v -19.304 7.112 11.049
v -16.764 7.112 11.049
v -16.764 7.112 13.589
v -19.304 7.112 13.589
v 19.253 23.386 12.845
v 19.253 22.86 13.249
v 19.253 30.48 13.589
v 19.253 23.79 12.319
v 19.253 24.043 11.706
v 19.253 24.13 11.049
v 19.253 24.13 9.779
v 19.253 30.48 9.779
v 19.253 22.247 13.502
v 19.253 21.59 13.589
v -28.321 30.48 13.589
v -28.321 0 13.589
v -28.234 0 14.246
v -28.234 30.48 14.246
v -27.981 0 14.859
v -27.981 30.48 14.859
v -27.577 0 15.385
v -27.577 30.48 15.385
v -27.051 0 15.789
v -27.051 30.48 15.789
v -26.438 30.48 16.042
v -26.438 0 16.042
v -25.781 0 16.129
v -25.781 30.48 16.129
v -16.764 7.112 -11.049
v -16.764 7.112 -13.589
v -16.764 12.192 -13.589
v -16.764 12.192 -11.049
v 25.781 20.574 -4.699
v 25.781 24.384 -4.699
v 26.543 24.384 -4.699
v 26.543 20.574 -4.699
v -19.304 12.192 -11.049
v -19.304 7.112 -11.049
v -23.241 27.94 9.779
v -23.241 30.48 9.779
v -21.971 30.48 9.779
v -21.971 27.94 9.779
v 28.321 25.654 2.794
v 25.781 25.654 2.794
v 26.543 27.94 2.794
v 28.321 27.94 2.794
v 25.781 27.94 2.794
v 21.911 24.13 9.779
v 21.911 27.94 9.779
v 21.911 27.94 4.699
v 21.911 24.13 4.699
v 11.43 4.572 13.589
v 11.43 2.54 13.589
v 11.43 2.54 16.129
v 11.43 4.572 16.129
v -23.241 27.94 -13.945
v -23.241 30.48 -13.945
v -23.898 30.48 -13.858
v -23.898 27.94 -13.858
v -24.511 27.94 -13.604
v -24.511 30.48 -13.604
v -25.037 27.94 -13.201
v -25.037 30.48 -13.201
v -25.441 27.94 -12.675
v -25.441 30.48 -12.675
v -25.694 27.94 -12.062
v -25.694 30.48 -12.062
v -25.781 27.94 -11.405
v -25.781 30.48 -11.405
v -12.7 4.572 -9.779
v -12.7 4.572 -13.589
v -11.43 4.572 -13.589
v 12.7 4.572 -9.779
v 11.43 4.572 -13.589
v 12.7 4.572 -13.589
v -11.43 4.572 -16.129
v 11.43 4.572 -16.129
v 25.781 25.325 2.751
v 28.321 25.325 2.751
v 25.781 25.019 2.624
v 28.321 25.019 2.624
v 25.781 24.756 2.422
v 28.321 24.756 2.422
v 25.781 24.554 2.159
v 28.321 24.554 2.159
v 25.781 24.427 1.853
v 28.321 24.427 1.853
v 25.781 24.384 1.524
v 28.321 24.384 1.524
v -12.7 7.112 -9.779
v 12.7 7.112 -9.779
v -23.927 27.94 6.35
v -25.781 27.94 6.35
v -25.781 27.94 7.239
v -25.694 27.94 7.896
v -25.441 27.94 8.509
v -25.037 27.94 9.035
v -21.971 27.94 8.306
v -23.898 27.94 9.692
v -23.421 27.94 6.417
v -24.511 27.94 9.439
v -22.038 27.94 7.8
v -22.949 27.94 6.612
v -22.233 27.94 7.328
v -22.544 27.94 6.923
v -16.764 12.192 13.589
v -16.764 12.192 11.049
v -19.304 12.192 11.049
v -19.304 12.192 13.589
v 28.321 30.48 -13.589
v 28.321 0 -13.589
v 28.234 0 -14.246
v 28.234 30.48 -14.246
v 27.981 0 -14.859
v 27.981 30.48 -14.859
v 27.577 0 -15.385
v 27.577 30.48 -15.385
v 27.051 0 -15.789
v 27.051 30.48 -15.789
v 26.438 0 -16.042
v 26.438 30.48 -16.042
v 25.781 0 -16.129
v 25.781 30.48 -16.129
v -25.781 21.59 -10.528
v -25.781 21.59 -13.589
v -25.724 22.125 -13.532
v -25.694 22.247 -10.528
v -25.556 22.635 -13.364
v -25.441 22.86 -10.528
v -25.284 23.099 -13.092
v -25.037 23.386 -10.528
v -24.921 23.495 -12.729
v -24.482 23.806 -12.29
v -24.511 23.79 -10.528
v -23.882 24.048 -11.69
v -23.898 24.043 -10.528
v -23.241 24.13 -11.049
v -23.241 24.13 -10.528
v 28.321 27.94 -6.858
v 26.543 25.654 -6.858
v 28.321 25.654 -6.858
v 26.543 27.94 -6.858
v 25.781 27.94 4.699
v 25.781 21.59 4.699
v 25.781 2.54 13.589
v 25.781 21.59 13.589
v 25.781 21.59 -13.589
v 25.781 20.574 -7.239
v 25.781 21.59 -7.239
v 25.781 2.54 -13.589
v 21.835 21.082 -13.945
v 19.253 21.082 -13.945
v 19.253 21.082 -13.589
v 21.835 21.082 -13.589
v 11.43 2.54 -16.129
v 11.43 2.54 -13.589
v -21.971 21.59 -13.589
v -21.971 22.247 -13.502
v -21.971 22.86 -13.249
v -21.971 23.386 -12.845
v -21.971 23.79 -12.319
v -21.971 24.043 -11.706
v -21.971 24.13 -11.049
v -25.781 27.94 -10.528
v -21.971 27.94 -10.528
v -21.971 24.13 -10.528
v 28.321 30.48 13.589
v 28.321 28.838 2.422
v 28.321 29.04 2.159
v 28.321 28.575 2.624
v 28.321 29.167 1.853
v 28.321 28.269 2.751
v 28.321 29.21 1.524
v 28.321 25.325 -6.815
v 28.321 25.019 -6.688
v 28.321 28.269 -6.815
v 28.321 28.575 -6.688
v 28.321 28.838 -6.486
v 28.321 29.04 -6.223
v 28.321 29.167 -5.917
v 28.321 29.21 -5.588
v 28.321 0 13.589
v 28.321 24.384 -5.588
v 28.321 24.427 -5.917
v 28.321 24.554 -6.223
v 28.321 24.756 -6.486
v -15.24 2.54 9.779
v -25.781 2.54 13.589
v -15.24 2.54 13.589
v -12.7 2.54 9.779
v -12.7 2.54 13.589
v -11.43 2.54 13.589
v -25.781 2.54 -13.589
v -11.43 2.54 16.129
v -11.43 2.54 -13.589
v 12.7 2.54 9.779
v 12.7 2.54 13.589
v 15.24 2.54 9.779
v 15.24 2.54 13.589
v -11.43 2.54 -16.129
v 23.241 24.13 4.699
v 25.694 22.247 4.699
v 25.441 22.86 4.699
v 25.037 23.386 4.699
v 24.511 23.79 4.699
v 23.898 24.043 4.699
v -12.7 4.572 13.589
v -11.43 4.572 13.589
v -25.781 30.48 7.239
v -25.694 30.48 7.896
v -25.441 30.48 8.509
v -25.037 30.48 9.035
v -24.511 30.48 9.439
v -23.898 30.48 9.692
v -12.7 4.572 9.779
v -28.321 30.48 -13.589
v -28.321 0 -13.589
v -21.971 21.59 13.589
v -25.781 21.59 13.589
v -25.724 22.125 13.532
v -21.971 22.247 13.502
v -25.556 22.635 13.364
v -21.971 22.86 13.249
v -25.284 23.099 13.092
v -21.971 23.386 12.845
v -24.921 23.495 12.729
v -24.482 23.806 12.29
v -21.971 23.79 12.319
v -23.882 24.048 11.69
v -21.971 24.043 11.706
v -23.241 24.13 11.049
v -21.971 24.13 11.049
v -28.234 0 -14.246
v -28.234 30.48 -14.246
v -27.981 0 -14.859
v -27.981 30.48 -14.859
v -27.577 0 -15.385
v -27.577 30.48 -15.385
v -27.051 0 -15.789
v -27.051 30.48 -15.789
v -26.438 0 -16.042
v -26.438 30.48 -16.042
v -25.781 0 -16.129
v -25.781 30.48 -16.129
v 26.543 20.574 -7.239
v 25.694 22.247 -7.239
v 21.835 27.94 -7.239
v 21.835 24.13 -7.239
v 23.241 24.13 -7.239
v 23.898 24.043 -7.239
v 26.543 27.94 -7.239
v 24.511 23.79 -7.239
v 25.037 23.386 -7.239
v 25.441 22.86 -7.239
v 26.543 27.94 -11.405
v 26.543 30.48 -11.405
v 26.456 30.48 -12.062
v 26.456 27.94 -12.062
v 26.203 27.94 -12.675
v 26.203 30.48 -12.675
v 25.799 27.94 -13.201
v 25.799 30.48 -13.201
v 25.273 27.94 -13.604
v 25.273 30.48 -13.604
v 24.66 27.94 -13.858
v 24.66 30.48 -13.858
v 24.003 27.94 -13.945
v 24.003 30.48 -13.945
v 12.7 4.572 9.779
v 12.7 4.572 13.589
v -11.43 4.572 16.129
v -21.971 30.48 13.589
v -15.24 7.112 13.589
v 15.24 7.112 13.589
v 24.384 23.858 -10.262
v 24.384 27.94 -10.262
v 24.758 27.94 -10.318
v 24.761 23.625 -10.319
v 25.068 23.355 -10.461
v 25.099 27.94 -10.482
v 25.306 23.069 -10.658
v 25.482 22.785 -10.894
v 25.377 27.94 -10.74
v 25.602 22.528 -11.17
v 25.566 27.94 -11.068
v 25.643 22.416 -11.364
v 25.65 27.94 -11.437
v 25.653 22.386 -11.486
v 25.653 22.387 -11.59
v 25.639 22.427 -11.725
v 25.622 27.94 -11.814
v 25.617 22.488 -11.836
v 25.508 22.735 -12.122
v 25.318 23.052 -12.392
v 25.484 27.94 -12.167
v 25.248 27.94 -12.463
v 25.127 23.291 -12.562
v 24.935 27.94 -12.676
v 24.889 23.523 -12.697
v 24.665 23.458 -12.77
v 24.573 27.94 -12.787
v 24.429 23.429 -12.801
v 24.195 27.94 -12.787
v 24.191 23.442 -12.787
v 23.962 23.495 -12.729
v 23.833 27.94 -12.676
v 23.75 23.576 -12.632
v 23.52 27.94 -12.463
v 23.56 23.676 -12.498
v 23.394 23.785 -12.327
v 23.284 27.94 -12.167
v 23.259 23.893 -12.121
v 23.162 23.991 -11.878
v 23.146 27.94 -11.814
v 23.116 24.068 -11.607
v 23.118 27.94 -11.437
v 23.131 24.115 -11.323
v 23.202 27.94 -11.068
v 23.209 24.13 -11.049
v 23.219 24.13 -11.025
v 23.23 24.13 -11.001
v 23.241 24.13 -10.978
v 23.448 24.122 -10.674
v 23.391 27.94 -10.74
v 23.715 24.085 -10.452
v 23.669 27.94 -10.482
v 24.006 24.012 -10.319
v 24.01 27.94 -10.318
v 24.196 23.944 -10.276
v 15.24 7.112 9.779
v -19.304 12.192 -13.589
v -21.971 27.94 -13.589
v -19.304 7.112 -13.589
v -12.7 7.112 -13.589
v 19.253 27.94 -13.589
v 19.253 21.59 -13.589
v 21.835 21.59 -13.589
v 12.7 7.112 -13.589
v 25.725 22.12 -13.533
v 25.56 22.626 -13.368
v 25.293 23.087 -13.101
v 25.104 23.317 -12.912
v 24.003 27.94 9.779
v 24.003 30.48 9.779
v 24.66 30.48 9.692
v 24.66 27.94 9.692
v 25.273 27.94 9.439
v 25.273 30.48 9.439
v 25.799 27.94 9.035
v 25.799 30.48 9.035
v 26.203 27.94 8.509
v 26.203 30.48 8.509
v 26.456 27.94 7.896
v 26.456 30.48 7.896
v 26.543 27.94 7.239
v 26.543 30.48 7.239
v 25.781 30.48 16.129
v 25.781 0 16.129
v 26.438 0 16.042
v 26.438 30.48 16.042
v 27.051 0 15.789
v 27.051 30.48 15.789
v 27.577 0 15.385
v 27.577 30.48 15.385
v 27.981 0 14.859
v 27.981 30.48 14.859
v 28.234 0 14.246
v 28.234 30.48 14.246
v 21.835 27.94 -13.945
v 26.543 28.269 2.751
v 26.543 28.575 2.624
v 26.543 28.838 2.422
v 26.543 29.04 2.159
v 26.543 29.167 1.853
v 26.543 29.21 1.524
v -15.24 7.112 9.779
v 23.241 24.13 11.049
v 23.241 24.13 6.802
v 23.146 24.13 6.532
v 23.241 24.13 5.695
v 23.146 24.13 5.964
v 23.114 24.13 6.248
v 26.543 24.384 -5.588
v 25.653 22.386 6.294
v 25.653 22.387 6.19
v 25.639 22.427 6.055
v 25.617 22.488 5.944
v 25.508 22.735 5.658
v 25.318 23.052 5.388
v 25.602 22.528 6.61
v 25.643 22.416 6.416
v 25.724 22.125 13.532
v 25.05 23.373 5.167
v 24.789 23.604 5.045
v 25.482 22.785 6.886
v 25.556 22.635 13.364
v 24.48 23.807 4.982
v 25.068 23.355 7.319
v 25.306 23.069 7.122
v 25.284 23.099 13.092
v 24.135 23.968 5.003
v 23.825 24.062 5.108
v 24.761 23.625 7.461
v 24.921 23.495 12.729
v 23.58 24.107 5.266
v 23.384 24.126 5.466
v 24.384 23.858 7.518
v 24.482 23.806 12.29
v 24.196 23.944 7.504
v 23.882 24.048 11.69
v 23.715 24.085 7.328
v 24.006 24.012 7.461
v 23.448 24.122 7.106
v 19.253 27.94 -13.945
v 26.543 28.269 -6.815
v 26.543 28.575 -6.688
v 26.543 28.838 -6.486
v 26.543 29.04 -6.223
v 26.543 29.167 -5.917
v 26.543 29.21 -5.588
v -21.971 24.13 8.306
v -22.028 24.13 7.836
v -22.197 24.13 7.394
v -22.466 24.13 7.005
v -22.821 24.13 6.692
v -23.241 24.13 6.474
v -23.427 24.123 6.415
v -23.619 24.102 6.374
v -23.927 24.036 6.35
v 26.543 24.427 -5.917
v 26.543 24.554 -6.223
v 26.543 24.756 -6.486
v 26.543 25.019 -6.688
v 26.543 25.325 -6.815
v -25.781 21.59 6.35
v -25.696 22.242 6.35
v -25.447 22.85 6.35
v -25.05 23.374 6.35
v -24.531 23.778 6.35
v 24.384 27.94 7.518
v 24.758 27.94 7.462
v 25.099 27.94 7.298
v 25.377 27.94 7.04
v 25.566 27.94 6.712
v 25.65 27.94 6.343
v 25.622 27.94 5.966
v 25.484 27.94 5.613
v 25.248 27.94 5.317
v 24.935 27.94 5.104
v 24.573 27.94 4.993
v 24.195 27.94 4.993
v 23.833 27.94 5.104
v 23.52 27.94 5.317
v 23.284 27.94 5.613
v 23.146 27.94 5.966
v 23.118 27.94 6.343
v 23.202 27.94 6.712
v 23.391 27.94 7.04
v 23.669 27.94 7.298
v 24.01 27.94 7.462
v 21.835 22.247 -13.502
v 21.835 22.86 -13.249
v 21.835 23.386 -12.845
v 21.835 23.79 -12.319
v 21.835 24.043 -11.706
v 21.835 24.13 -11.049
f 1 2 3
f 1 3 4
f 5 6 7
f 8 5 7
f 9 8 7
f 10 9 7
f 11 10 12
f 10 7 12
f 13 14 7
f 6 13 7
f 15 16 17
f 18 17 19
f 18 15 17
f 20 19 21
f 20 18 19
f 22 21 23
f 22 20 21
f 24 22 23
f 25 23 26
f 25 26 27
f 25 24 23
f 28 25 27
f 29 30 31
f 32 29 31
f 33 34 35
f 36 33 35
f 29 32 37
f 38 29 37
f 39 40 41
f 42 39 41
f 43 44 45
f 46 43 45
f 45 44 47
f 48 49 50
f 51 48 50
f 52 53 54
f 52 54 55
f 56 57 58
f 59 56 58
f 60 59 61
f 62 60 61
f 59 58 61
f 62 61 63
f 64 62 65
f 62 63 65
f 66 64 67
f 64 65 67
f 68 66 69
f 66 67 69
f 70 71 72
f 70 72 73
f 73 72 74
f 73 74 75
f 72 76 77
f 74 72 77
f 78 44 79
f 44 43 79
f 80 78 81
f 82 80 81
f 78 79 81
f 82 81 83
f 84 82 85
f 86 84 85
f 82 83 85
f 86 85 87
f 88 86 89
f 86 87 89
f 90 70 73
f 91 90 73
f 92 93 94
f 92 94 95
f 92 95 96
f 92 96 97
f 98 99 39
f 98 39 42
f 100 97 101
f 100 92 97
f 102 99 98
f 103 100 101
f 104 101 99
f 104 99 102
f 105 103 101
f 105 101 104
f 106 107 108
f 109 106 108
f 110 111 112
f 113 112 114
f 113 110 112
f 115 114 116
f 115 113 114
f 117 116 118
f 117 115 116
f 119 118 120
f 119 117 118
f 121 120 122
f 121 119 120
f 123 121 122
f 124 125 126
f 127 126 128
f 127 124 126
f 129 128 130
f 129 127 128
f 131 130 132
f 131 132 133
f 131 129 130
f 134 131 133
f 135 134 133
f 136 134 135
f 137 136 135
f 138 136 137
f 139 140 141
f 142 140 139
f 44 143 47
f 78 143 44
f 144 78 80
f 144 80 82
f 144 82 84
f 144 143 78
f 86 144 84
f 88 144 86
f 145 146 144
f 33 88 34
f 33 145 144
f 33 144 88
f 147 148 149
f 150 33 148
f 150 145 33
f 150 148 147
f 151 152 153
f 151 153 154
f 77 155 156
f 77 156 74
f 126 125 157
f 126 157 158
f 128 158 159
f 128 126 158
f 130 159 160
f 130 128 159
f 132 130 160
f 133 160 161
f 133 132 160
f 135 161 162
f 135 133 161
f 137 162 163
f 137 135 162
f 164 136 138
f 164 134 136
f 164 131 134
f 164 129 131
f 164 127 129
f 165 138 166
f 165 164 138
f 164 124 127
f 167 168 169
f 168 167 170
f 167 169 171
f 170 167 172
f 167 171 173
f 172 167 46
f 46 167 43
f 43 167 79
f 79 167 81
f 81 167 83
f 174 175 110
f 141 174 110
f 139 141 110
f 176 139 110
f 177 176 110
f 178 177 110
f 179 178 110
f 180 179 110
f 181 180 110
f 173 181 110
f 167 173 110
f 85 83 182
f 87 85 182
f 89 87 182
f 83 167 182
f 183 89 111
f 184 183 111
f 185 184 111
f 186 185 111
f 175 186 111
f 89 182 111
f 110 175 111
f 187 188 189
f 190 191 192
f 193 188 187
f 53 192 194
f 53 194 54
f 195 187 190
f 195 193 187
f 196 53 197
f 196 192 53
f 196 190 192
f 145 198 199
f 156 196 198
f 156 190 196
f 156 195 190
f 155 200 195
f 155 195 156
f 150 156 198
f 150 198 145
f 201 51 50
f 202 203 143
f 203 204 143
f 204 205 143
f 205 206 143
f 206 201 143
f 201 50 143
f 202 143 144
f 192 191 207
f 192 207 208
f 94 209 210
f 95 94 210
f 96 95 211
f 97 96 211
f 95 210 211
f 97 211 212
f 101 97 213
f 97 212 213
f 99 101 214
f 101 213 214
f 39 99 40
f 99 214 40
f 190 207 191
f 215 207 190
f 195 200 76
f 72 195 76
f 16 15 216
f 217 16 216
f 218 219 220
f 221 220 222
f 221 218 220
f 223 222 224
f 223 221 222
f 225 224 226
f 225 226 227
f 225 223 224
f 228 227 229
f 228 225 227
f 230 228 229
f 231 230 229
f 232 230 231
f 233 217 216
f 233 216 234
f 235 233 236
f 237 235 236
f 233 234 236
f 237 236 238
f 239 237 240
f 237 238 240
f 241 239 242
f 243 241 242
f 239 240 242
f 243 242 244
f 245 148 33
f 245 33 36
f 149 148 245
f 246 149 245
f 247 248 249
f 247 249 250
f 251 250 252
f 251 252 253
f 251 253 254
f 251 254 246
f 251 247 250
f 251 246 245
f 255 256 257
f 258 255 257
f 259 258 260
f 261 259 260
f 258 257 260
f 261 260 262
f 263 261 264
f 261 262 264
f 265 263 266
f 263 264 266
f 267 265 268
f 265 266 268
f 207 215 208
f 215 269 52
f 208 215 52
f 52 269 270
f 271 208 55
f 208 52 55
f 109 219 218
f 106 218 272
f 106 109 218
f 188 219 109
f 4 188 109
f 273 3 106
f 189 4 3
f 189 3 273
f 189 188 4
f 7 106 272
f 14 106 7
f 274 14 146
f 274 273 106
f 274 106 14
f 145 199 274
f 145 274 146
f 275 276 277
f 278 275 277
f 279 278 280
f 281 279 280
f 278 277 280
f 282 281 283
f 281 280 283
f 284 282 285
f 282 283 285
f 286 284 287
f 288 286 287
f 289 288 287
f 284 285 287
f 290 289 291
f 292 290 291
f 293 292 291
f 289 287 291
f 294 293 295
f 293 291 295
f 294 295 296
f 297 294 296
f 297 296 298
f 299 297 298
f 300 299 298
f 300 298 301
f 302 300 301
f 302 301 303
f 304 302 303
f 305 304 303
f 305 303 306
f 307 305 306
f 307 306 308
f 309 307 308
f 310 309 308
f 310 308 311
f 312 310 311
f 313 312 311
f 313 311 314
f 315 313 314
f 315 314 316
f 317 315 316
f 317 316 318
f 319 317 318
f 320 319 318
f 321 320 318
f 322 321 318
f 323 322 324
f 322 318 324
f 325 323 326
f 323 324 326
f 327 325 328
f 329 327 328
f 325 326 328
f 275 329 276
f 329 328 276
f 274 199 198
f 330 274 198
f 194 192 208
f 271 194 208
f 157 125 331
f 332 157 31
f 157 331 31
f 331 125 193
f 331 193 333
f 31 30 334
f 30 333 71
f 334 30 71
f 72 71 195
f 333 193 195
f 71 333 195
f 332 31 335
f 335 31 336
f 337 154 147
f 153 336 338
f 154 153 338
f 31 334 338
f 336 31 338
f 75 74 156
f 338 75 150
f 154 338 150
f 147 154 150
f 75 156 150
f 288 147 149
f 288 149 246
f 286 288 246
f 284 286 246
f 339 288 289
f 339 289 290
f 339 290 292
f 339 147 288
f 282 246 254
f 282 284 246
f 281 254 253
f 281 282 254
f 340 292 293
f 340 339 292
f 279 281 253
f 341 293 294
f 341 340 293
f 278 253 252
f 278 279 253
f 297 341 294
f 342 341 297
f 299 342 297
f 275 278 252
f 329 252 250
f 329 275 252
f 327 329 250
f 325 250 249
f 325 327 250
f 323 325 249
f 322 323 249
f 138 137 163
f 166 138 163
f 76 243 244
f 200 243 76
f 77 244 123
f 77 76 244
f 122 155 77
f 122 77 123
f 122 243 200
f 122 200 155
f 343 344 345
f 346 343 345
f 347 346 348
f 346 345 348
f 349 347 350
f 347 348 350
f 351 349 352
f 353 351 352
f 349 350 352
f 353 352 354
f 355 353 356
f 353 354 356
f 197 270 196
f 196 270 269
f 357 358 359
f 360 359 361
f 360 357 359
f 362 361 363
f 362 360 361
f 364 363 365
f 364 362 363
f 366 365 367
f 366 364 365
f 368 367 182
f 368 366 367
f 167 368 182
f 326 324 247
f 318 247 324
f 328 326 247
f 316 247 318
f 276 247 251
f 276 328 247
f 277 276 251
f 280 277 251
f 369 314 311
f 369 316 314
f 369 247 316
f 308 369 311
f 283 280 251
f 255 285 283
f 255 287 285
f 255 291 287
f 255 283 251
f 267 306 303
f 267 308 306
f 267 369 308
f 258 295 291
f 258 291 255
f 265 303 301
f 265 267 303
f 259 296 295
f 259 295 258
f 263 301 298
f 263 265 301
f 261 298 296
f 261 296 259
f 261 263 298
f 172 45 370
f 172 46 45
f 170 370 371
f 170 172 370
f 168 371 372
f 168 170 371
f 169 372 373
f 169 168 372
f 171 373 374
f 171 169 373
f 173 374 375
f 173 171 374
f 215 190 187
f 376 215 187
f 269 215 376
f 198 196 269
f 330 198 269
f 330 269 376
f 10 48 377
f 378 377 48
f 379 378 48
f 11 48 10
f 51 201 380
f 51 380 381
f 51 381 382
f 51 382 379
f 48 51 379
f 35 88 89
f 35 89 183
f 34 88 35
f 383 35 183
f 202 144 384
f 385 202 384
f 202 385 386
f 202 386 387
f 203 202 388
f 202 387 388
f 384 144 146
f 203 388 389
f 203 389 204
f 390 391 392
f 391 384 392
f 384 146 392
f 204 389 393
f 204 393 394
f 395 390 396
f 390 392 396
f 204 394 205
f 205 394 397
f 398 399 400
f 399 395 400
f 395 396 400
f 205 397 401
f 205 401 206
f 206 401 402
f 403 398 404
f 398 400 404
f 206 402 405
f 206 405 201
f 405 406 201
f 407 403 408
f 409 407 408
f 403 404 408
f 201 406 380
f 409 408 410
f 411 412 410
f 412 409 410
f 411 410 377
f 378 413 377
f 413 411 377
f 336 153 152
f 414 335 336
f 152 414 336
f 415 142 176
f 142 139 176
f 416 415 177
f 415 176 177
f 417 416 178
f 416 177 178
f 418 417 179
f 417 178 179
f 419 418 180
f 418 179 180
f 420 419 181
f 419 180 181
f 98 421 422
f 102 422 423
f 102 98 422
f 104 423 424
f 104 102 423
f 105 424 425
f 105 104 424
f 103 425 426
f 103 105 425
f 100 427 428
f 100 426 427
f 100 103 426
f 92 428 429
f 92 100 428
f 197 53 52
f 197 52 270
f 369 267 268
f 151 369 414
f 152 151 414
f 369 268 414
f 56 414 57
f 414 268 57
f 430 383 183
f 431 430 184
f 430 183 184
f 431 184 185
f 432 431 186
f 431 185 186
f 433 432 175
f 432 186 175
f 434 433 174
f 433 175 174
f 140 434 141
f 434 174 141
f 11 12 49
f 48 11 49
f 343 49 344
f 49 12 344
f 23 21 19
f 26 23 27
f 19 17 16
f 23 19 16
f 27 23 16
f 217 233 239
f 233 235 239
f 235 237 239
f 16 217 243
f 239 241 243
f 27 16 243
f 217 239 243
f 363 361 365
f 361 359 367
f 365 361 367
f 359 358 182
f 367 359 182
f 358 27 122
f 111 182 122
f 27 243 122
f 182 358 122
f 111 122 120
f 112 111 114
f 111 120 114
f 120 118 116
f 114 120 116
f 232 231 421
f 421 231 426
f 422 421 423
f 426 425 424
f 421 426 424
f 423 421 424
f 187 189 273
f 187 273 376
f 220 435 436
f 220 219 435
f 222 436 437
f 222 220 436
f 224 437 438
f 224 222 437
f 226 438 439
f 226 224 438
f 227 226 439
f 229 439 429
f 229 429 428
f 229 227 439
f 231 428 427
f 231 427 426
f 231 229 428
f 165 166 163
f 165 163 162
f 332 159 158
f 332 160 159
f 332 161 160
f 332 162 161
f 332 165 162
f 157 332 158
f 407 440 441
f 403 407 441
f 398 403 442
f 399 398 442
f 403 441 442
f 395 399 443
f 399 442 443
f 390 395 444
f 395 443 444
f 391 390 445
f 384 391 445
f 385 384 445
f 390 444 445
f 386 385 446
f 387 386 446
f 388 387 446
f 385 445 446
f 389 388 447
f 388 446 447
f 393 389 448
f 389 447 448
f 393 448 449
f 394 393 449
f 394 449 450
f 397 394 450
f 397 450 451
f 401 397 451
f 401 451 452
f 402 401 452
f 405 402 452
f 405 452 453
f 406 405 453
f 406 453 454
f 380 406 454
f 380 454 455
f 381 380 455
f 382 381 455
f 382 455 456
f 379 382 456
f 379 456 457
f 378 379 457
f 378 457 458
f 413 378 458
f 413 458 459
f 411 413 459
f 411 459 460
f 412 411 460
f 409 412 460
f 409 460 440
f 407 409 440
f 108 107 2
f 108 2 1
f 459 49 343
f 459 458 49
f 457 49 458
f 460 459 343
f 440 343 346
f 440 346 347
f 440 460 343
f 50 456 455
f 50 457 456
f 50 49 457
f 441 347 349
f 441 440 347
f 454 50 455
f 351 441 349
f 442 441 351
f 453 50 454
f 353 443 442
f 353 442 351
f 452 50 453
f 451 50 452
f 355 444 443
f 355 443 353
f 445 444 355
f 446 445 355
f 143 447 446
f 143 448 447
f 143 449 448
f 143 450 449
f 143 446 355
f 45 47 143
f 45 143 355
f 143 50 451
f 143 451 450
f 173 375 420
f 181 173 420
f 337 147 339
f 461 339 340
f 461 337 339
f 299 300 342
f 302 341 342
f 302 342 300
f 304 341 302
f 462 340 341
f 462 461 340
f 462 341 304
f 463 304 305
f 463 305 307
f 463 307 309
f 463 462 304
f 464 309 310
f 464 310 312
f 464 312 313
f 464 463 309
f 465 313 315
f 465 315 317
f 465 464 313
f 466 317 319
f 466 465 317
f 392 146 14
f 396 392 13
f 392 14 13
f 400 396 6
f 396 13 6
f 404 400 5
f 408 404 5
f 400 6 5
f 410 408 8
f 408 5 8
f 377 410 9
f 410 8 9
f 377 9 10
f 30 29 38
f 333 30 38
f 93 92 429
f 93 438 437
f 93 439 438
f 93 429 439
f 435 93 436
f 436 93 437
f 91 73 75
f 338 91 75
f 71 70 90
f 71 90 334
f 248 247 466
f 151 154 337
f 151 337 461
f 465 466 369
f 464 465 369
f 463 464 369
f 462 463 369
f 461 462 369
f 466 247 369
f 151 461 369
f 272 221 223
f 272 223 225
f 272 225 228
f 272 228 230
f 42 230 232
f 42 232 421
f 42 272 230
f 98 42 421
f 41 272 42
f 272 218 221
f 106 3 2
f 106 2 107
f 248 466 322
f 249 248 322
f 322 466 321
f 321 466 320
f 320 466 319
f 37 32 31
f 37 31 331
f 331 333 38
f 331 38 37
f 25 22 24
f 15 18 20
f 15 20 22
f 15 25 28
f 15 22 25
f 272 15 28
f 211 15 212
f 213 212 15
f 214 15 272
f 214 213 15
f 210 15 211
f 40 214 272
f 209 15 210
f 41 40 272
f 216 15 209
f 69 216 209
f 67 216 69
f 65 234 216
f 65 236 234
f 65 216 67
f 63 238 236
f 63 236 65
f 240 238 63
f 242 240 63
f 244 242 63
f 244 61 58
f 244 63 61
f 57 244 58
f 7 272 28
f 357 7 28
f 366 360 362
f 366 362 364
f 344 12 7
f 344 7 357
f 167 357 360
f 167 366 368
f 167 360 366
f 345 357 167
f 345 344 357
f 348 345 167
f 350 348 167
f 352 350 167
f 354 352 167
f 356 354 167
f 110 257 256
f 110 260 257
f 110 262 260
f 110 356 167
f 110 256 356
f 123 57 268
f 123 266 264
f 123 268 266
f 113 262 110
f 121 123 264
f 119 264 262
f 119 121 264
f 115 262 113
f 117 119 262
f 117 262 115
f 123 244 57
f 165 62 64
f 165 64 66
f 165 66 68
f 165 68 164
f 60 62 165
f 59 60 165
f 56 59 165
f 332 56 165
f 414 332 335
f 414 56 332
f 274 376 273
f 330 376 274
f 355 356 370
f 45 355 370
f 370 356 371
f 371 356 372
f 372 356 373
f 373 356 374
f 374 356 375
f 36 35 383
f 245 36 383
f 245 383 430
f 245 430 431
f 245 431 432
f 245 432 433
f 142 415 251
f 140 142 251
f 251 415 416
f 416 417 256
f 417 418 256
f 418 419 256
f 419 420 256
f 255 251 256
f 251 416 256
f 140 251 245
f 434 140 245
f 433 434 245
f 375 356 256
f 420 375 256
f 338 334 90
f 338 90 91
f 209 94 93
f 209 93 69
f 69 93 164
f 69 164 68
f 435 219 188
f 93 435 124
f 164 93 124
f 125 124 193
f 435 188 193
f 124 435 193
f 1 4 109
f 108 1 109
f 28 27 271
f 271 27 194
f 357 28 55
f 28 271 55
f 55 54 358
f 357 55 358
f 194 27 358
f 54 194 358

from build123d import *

# Parameters (mm, degrees)
SKETCH1_W           = 56.642
SKETCH1_H           = 32.258
BOSS_EXTRUDE1_DEPTH = 30.48
SHELL1_T            = -2.54
BOSS_EXTRUDE2_DEPTH = 6.35
FILLET2_R           = 2.54
FILLET3_R           = 2.54
CUT_EXTRUDE9_REACH  = 54.647
SKETCH10_W          = 22.86
SKETCH10_H          = 2.032
BOSS_EXTRUDE3_REACH = 46.623
SKETCH13_W          = 2.54
SKETCH13_H          = 3.81
SKETCH14_W          = 3.81
SKETCH14_H          = 1.27
BOSS_EXTRUDE4_DEPTH = 25.4
CUT_EXTRUDE10_DEPTH = 2.54
CUT_EXTRUDE11_REACH = 46.623
SKETCH16_W          = 9.652
SKETCH16_H          = 4.826
SKETCH11_R          = 1.27
CUT_EXTRUDE12_DEPTH = 9.398
MIRROR2_START       = 4.572
MIRROR2_OUTLINE_W   = 25.4
MIRROR2_OUTLINE_H   = 3.81
MIRROR2_DEPTH       = 2.54
SKETCH17_W          = 2.54
SKETCH17_H          = 3.81
CUT_EXTRUDE13_DEPTH = 23.368
SKETCH18_W          = 7.2898
SKETCH18_H          = 2.54
CUT_EXTRUDE14_DEPTH = 7.366
FILLET4_R           = 1.27
SKETCH19_W          = 2.54
SKETCH19_H          = 5.08
BOSS_EXTRUDE5_DEPTH = 2.54
CUT_EXTRUDE15_START = -23.368
SKETCH20_W          = 2.54
SKETCH20_H          = 3.81
CUT_EXTRUDE15_DEPTH = 23.368
SKETCH22_W          = 2.657331224
SKETCH22_H          = 5.08
CUT_EXTRUDE18_DEPTH = 6.858
SKETCH23_W          = 2.581688451
SKETCH23_H          = 6.7056
CUT_EXTRUDE19_DEPTH = 6.858
SKETCH24_W          = 4.254264989
SKETCH24_H          = 4.461970644
CUT_EXTRUDE20_DEPTH = 7.112


# Read off the part's stored shape, not the designer's step: Mirror2
with BuildPart() as part:
    # Sketch1 → Boss-Extrude1 (new body)
    with BuildSketch(Plane(origin=(0, 0, 0), x_dir=(1, 0, 0), z_dir=(0, 1, 0))):
        Rectangle(SKETCH1_W, SKETCH1_H)
    extrude(amount=BOSS_EXTRUDE1_DEPTH)

    # Shell1
    shell1_openings = [part.faces().sort_by_distance(p)[0] for p in [
        (0, 30.48, 0),
    ]]
    offset(amount=SHELL1_T, openings=shell1_openings, kind=Kind.INTERSECTION)

    # Sketch3 → Boss-Extrude2 (add)
    with BuildSketch(Plane(origin=(0, 30.48, 0), x_dir=(1, 0, 0), z_dir=(0, 1, 0))):
        with BuildLine():
            Line((-25.781, 13.589), (-25.781, 6.35))
            Line((-25.781, 6.35), (-23.9268, 6.35))
            ThreePointArc((-23.9268, 6.35), (-22.543840557, 6.922840557), (-21.971, 8.3058))
            Line((-21.971, 8.3058), (-21.971, 13.589))
            Line((-21.971, 13.589), (-25.781, 13.589))
        make_face()
        with BuildLine():
            Line((-21.971, -13.589), (-21.971, -8.3058))
            ThreePointArc((-21.971, -8.3058), (-22.543840557, -6.922840557), (-23.9268, -6.35))
            Line((-23.9268, -6.35), (-25.781, -6.35))
            Line((-25.781, -6.35), (-25.781, -13.589))
            Line((-25.781, -13.589), (-21.971, -13.589))
        make_face()
        with BuildLine():
            Line((25.781, 13.589), (19.2532, 13.589))
            Line((19.2532, 13.589), (19.2532, 5.969))
            ThreePointArc((19.2532, 5.969), (19.625174388, 5.070974388), (20.5232, 4.699))
            Line((20.5232, 4.699), (25.781, 4.699))
            Line((25.781, 4.699), (25.781, 13.589))
        make_face()
        with BuildLine():
            Line((25.781, -4.699), (25.781, -13.589))
            Line((25.781, -13.589), (19.2532, -13.589))
            Line((19.2532, -13.589), (19.2532, -5.969))
            ThreePointArc((19.2532, -5.969), (19.625174388, -5.070974388), (20.5232, -4.699))
            Line((20.5232, -4.699), (25.781, -4.699))
        make_face()
    extrude(amount=-BOSS_EXTRUDE2_DEPTH)

    # Fillet2
    fillet2_edges = [part.edges().sort_by_distance(p)[0] for p in [
        (28.321, 15.24, 16.129),
        (-28.321, 15.24, 16.129),
        (-28.321, 15.24, -16.129),
        (28.321, 15.24, -16.129),
    ]]
    fillet(fillet2_edges, radius=FILLET2_R)

    # Fillet3
    fillet3_edges = [part.edges().sort_by_distance(p)[0] for p in [
        (-25.781, 24.13, 9.9695),
        (-23.876, 24.13, 13.589),
        (22.5171, 24.13, 13.589),
        (25.781, 24.13, 9.144),
        (-23.876, 24.13, -13.589),
        (-25.781, 24.13, -9.9695),
        (22.5171, 24.13, -13.589),
        (25.781, 24.13, -9.144),
    ]]
    fillet(fillet3_edges, radius=FILLET3_R)

    # Cut-Extrude9: up to this face of the body (flat: up to its plane)
    cut_extrude9_end = Plane(part.part.faces().sort_by_distance((0, 15.24, 16.129))[0])
    # Sketch10 → Cut-Extrude9 (cut, up to the picked face)
    with BuildSketch(Plane(origin=(0, 0, -16.129), x_dir=(-1, 0, 0), z_dir=(0, 0, -1)), mode=Mode.PRIVATE) as cut_extrude9_sk1:
        with Locations((0, 3.556)):
            Rectangle(SKETCH10_W, SKETCH10_H)
    cut_extrude9_tool1 = split(extrude(cut_extrude9_sk1.sketch, amount=-CUT_EXTRUDE9_REACH, mode=Mode.PRIVATE), bisect_by=cut_extrude9_end, keep=Keep.BOTH, mode=Mode.PRIVATE)
    add(cut_extrude9_tool1.solids().sort_by(Axis((0, 3.556, -16.129), (0, 0, 1)))[0], mode=Mode.SUBTRACT)

    # Sketch13 → Boss-Extrude3 (add, up to next)
    with BuildSketch(Plane(origin=(0, 30.48, 0), x_dir=(1, 0, 0), z_dir=(0, 1, 0)), mode=Mode.PRIVATE) as boss_extrude3_sk1:
        with Locations((-13.97, -11.684)):
            Rectangle(SKETCH13_W, SKETCH13_H)
    boss_extrude3_tool1 = extrude(boss_extrude3_sk1.sketch, amount=-BOSS_EXTRUDE3_REACH, mode=Mode.PRIVATE) - part.part
    boss_extrude3 = boss_extrude3_tool1.solids().sort_by_distance((-13.97, 30.48, 11.684))[0]
    add(boss_extrude3)

    # Mirror1: Boss-Extrude3 across plane
    add(boss_extrude3.mirror(Plane(origin=(0, 0, 0), x_dir=(0, 0, 1), z_dir=(1, 0, 0))))

    # Sketch14 → Boss-Extrude4 (add)
    with BuildSketch(Plane.ZY.offset(-12.7)):
        with Locations((11.684, 5.207)):
            Rectangle(SKETCH14_W, SKETCH14_H)
    extrude(amount=BOSS_EXTRUDE4_DEPTH)

    # Sketch15 → Cut-Extrude10 (cut)
    with BuildSketch(Plane(origin=(0, 30.48, 0), x_dir=(1, 0, 0), z_dir=(0, 1, 0))):
        with BuildLine():
            Line((-25.781, 11.4046), (-25.781, 6.35))
            Line((-25.781, 6.35), (-23.9268, 6.35))
            ThreePointArc((-23.9268, 6.35), (-22.543840557, 6.922840557), (-21.971, 8.3058))
            Line((-21.971, 8.3058), (-21.971, 13.589))
            Line((-21.971, 13.589), (19.2532, 13.589))
            Line((19.2532, 13.589), (19.2532, 5.969))
            ThreePointArc((19.2532, 5.969), (19.625174388, 5.070974388), (20.5232, 4.699))
            Line((20.5232, 4.699), (25.781, 4.699))
            Line((25.781, 4.699), (25.781, -4.699))
            Line((25.781, -4.699), (20.5232, -4.699))
            ThreePointArc((20.5232, -4.699), (19.625174388, -5.070974388), (19.2532, -5.969))
            Line((19.2532, -5.969), (19.2532, -9.779))
            Line((19.2532, -9.779), (24.003, -9.779))
            ThreePointArc((24.003, -9.779), (25.799051224, -9.035051224), (26.543, -7.239))
            Line((26.543, -7.239), (26.543, -1.000588636))
            Line((26.543, -1.000588636), (26.543, 5.166188636))
            Line((26.543, 5.166188636), (26.543, 11.4046))
            ThreePointArc((26.543, 11.4046), (25.799051224, 13.200651224), (24.003, 13.9446))
            Line((24.003, 13.9446), (-23.241, 13.9446))
            ThreePointArc((-23.241, 13.9446), (-25.037051224, 13.200651224), (-25.781, 11.4046))
        make_face()
        with BuildLine():
            Line((-25.781, -6.35), (-25.781, -7.239))
            ThreePointArc((-25.781, -7.239), (-25.037051224, -9.035051224), (-23.241, -9.779))
            Line((-23.241, -9.779), (-21.971, -9.779))
            Line((-21.971, -9.779), (-21.971, -8.3058))
            ThreePointArc((-21.971, -8.3058), (-22.543840557, -6.922840557), (-23.9268, -6.35))
            Line((-23.9268, -6.35), (-25.781, -6.35))
        make_face()
    extrude(amount=-CUT_EXTRUDE10_DEPTH, mode=Mode.SUBTRACT)

    # Cut-Extrude11: up to this face of the body (flat: up to its plane)
    cut_extrude11_end = Plane(part.part.faces().sort_by_distance((28.321, 15.24, 0))[0])
    # Sketch16 → Cut-Extrude11 (cut, up to the picked face)
    with BuildSketch(Plane(origin=(0, 0, 0), x_dir=(0, 0, -1), z_dir=(1, 0, 0)), mode=Mode.PRIVATE) as cut_extrude11_sk1:
        with Locations((2.032, 26.797)):
            Rectangle(SKETCH16_W, SKETCH16_H)
    cut_extrude11_tool1 = split(extrude(cut_extrude11_sk1.sketch, amount=CUT_EXTRUDE11_REACH, mode=Mode.PRIVATE), bisect_by=cut_extrude11_end, keep=Keep.BOTH, mode=Mode.PRIVATE)
    add(cut_extrude11_tool1.solids().sort_by(Axis((0, 26.797, -2.032), (1, 0, 0)))[0], mode=Mode.SUBTRACT)

    # Sketch11 → Cut-Extrude12 (cut)
    with BuildSketch(Plane(origin=(0, 30.48, 0), x_dir=(1, 0, 0), z_dir=(0, 1, 0))):
        with Locations(Location((24.384, 11.5316, 0), (0, 0, 270))):
            Circle(SKETCH11_R)
        with Locations(Location((24.384, -6.2484, 0), (0, 0, 270))):
            Circle(SKETCH11_R)
    extrude(amount=-CUT_EXTRUDE12_DEPTH, mode=Mode.SUBTRACT)

    # Mirror2 outline → Mirror2 (add)
    with BuildSketch(Plane(origin=(0, 0, 0), x_dir=(1, 0, 0), z_dir=(0, 1, 0)).offset(MIRROR2_START)):
        with Locations((0, 11.684)):
            Rectangle(MIRROR2_OUTLINE_W, MIRROR2_OUTLINE_H)
        with Locations((0, -11.684)):
            Rectangle(MIRROR2_OUTLINE_W, MIRROR2_OUTLINE_H)
    extrude(amount=MIRROR2_DEPTH)

    # Sketch17 → Cut-Extrude13 (cut)
    with BuildSketch(Plane(origin=(0, 30.48, 0), x_dir=(1, 0, 0), z_dir=(0, 1, 0))):
        with Locations((-13.97, -11.684)):
            Rectangle(SKETCH17_W, SKETCH17_H)
    extrude(amount=-CUT_EXTRUDE13_DEPTH, mode=Mode.SUBTRACT)

    # Sketch18 → Cut-Extrude14 (cut)
    with BuildSketch(Plane(origin=(0, 27.94, 0), x_dir=(1, 0, 0), z_dir=(0, 1, 0))):
        with Locations((22.8981, 5.969)):
            Rectangle(SKETCH18_W, SKETCH18_H)
    extrude(amount=-CUT_EXTRUDE14_DEPTH, mode=Mode.SUBTRACT)

    # Fillet4
    fillet4_edges = [part.edges().sort_by_distance(p)[0] for p in [
        (27.432, 29.21, -6.858),
        (27.432, 24.384, -6.858),
        (27.051, 24.384, 2.794),
        (27.432, 29.21, 2.794),
    ]]
    fillet(fillet4_edges, radius=FILLET4_R)

    # Sketch19 → Boss-Extrude5 (add)
    with BuildSketch(Plane(origin=(0, 0, 13.589), x_dir=(-1, 0, 0), z_dir=(0, 0, -1))):
        with Locations((18.034, 9.652)):
            Rectangle(SKETCH19_W, SKETCH19_H)
    boss_extrude5 = extrude(amount=BOSS_EXTRUDE5_DEPTH)

    # Mirror3: Boss-Extrude5 across plane
    add(boss_extrude5.mirror(Plane.XY))

    # Sketch20 → Cut-Extrude15 (cut)
    with BuildSketch(Plane(origin=(0, 30.48, 0), x_dir=(1, 0, 0), z_dir=(0, 1, 0)).offset(CUT_EXTRUDE15_START)):
        with Locations((13.97, -11.684)):
            Rectangle(SKETCH20_W, SKETCH20_H)
    extrude(amount=CUT_EXTRUDE15_DEPTH, mode=Mode.SUBTRACT)

    # Sketch22 → Cut-Extrude18 (cut)
    with BuildSketch(Plane(origin=(0, 27.94, 0), x_dir=(1, 0, 0), z_dir=(0, 1, 0))):
        with Locations((20.581865612, -7.239)):
            Rectangle(SKETCH22_W, SKETCH22_H)
    extrude(amount=-CUT_EXTRUDE18_DEPTH, mode=Mode.SUBTRACT)

    # Sketch23 → Cut-Extrude19 (cut)
    with BuildSketch(Plane(origin=(0, 27.94, 0), x_dir=(1, 0, 0), z_dir=(0, 1, 0))):
        with Locations((20.544044226, 10.5918)):
            Rectangle(SKETCH23_W, SKETCH23_H)
    extrude(amount=-CUT_EXTRUDE19_DEPTH, mode=Mode.SUBTRACT)

    # Sketch24 → Cut-Extrude20 (cut)
    with BuildSketch(Plane(origin=(0, 27.94, 0), x_dir=(1, 0, 0), z_dir=(0, 1, 0))):
        with Locations((-23.653867506, 8.297478086)):
            Rectangle(SKETCH24_W, SKETCH24_H)
    extrude(amount=-CUT_EXTRUDE20_DEPTH, mode=Mode.SUBTRACT)


solid = part.part
